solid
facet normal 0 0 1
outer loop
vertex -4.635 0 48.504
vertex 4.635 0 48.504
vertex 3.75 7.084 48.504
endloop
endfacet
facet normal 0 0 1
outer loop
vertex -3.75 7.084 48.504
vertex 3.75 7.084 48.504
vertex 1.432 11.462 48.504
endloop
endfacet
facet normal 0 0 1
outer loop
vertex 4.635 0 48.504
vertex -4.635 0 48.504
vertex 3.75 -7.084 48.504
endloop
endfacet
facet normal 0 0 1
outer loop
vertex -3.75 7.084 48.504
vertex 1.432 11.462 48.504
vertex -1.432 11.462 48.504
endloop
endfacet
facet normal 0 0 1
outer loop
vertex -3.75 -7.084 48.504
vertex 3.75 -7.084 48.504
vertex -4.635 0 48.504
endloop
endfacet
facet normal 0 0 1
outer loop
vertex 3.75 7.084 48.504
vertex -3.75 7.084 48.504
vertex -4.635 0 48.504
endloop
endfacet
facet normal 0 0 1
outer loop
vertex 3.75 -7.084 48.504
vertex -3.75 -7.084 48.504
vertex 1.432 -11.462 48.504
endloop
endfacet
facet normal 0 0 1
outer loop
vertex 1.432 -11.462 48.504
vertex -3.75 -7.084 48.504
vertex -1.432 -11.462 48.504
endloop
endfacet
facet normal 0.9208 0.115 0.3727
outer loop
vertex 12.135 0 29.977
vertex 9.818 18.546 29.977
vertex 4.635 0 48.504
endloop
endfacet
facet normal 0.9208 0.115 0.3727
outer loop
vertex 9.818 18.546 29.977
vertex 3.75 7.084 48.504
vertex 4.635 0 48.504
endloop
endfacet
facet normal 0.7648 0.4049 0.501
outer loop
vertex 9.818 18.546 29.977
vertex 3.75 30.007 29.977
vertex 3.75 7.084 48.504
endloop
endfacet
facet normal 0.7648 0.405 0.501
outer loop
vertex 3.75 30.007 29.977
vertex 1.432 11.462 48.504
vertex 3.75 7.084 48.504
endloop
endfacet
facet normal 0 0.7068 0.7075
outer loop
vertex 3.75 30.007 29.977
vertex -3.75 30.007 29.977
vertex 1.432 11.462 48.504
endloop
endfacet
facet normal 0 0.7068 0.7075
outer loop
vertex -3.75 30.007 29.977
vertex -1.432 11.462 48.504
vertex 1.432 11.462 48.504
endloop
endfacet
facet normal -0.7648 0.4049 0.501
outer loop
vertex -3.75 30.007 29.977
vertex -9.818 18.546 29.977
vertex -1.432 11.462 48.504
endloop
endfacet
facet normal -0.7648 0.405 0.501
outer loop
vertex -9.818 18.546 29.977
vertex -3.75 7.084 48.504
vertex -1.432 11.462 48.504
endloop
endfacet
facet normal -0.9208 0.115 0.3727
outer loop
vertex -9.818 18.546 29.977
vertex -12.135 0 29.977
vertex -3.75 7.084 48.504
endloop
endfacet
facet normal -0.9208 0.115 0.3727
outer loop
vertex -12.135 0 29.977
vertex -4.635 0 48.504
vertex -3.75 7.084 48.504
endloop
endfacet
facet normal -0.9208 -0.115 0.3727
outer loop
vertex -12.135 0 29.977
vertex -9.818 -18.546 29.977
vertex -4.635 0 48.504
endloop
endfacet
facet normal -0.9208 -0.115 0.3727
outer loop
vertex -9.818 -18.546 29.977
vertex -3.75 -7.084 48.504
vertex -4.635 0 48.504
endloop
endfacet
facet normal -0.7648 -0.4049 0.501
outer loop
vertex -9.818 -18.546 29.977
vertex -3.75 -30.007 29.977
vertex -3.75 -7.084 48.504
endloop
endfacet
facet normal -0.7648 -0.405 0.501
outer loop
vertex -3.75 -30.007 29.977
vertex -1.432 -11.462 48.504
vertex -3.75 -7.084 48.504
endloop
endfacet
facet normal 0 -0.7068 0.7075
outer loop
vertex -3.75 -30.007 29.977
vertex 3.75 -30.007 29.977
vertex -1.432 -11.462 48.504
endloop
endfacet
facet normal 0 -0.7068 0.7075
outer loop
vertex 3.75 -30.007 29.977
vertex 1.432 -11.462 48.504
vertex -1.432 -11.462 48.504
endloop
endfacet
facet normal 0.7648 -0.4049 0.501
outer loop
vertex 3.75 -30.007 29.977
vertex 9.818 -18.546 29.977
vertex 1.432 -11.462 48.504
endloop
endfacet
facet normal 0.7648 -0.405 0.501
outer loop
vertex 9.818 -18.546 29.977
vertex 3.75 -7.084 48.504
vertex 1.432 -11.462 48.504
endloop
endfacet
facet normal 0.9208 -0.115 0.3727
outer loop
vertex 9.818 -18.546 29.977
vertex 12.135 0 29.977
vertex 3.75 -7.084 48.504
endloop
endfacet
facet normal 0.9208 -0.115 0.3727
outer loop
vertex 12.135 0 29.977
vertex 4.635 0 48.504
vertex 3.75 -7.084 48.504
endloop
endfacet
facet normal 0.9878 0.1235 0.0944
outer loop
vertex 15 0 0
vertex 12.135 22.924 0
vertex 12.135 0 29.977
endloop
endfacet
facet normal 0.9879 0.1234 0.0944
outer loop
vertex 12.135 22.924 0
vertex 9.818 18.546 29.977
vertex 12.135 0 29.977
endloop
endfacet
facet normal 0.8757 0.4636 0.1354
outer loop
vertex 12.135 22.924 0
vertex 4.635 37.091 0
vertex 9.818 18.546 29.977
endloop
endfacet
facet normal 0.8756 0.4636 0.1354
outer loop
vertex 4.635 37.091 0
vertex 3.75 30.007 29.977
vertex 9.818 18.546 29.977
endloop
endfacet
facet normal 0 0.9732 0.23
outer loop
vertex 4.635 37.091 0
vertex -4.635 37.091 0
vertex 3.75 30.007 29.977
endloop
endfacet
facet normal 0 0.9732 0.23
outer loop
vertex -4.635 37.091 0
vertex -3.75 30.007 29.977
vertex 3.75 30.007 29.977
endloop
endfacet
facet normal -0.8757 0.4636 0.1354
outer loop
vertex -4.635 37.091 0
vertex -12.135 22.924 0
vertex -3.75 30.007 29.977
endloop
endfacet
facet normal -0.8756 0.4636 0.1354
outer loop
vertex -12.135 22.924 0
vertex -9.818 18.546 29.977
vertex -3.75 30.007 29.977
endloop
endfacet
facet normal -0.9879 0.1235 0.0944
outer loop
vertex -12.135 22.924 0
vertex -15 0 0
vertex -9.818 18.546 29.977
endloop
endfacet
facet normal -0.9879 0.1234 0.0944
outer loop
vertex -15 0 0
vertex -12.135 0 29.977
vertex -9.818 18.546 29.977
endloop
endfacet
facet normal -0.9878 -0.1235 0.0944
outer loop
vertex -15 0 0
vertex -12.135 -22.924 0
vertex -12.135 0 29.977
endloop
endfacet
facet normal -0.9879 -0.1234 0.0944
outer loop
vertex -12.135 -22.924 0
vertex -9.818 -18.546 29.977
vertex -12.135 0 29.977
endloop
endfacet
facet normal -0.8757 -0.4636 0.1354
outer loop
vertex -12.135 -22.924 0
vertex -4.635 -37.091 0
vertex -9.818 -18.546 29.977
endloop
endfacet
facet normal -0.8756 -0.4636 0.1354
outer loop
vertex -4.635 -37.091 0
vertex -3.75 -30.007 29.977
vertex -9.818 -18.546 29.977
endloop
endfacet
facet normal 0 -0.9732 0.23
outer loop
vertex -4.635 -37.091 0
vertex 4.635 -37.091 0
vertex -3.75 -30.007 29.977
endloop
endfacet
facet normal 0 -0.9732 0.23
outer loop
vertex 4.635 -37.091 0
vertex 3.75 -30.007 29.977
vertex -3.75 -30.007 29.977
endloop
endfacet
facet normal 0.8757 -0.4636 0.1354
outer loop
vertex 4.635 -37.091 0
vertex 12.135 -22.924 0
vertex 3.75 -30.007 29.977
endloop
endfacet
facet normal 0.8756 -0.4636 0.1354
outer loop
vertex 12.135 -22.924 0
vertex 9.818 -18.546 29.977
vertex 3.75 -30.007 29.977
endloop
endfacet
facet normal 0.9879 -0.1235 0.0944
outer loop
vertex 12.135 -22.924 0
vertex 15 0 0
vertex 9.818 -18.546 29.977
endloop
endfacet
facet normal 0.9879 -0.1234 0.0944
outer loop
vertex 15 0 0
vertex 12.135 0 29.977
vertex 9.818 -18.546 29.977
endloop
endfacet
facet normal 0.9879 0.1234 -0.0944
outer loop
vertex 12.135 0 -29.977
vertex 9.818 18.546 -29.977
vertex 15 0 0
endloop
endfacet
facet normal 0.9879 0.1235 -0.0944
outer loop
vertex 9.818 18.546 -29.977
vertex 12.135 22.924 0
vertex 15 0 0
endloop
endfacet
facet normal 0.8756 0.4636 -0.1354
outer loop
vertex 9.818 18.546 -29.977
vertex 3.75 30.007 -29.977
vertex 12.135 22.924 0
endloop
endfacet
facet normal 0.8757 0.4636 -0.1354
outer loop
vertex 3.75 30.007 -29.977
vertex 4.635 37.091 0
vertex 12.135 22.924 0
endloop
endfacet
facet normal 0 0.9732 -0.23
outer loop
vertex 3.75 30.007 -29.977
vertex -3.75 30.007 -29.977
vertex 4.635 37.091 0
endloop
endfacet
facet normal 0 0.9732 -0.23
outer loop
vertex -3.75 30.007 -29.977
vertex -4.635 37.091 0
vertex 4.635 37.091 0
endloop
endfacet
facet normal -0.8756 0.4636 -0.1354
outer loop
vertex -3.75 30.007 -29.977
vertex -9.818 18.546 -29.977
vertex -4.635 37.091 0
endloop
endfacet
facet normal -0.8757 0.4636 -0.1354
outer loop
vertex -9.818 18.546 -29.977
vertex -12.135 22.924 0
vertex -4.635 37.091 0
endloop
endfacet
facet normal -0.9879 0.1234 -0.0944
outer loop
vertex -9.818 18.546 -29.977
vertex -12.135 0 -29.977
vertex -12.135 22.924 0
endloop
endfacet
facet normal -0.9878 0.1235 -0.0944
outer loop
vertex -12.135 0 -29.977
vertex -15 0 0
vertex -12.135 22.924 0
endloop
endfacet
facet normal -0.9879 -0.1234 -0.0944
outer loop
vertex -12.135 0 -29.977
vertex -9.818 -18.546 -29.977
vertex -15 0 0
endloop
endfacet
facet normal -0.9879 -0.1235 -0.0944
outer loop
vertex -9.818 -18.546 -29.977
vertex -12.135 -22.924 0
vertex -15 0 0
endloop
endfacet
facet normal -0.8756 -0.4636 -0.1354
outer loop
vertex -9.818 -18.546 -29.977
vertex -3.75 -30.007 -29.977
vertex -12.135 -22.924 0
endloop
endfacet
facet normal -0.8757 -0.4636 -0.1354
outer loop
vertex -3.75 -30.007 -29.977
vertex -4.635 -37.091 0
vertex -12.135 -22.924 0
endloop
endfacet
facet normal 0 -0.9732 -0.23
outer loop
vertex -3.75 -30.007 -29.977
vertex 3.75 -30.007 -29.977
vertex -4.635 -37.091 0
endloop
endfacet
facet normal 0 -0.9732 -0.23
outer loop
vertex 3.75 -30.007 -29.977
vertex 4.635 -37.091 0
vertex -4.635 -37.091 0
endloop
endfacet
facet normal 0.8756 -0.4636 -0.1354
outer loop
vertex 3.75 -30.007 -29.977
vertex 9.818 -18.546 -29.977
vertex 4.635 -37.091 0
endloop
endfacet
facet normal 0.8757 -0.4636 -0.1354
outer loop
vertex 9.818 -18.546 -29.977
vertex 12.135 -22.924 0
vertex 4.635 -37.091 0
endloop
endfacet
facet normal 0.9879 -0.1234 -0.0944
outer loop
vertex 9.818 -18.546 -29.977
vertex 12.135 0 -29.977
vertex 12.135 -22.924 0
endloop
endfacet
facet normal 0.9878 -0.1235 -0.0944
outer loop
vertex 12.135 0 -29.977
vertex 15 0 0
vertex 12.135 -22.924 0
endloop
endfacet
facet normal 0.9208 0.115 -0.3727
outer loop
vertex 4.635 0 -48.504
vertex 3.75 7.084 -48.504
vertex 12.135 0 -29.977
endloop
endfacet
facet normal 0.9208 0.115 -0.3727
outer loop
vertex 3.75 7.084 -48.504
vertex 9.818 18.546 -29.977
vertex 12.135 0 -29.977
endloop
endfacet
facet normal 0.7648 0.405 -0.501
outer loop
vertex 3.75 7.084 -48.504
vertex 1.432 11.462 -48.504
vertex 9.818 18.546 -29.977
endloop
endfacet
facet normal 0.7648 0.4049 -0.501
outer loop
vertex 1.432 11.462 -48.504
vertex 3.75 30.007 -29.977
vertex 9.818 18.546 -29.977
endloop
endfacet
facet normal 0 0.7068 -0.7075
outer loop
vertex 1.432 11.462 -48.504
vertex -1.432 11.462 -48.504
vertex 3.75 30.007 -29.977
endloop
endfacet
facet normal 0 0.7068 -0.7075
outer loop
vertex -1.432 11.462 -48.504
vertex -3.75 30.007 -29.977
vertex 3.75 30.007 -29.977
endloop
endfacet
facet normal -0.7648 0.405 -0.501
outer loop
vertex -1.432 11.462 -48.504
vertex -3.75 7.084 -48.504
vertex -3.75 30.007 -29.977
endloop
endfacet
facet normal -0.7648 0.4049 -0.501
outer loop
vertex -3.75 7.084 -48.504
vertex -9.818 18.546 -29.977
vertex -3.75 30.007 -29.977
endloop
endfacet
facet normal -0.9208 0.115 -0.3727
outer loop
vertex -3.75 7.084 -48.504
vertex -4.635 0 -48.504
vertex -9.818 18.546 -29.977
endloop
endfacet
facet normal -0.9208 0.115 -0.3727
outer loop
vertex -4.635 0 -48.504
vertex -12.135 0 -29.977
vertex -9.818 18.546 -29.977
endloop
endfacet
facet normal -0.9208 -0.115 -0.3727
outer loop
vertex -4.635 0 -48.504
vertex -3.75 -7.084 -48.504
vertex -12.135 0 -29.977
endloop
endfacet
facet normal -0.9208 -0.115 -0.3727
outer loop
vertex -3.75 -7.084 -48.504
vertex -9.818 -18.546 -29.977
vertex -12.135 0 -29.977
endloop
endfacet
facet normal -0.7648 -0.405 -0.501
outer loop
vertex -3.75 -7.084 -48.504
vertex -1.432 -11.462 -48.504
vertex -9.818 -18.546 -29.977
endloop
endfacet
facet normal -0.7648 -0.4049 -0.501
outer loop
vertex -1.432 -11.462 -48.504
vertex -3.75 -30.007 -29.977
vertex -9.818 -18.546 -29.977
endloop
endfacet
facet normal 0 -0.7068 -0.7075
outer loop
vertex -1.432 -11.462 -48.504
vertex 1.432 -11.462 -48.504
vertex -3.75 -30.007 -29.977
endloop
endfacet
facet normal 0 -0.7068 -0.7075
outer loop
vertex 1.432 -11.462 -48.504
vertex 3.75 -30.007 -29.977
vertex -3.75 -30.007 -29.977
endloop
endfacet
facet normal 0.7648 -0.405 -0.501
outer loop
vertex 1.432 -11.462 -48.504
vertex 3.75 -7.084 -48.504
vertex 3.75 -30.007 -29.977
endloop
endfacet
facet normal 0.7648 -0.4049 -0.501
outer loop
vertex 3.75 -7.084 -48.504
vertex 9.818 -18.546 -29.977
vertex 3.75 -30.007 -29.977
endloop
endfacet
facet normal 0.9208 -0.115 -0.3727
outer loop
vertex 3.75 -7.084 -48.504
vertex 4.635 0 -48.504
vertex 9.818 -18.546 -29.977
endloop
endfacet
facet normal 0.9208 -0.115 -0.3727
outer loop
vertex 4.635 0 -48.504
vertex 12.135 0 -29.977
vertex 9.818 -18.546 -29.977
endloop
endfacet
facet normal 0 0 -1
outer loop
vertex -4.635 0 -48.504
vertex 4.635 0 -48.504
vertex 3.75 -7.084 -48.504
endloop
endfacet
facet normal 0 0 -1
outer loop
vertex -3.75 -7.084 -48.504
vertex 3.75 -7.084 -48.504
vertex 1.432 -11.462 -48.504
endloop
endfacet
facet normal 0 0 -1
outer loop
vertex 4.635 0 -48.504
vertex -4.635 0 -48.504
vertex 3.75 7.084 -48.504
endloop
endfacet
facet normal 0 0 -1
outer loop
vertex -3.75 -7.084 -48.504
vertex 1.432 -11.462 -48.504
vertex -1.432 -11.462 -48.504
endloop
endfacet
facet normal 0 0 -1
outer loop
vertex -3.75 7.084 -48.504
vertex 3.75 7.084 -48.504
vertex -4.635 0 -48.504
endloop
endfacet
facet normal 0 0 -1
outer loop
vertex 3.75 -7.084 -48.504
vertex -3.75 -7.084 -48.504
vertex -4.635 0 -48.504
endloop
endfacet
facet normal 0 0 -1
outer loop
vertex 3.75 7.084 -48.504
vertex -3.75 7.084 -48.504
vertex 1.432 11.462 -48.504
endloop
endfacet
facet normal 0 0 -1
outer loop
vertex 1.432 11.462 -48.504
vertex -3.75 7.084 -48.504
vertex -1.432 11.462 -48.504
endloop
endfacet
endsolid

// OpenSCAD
// Generated by SolidPython 1.0.1 on 2020-07-29 00:46:46


scale(v = [5, 13, 17]) {
	sphere(r = 3);
}
/***********************************************
*********      SolidPython code:      **********
************************************************
 
# import packages: SolidPython
from solid import *
from solid.utils import *
from itertools import chain, combinations, permutations


class Resize:

    def __init__(self, scad_file):
        self.scad_file = scad_file
        #self.scad_file = import_scad(scad_file)
        # cone/cylinder param:
        self.r1 = 0
        self.r2 = 0
        self.h = 0
        # rectangular prism param:
        self.w = 0
        self.l = 0
        # ellipse param:
        self.r = 0

    # import OpenScad code (file name corresponds to shape)


    # classify shape + parameters
    def assign(self, param1, param2, param3):
        if self.scad_file == 'cone.scad':
            self.r1 = param1
            self.r2 = param2
            self.h = param3
        elif self.scad_file == 'cylinder.scad':
            self.r1 = param1
            self.r2 = param2
            self.h = param3
        elif self.scad_file == 'rectangularPrism.scad':
            self.h = param1
            self.l = param2
            self.w = param3
        else:
            self.r = param1
            self.h = param2

    # resize parameters
    def iterate(self):
        x = range(3, 20, 2)
        i = 1
        if self.scad_file == 'cone.scad':
            tempList = list(permutations(x, 2))
            for temp in tempList:
                param1 = temp[0]
                param2 = temp[1]
                filepath = 'produced_scad_files/' + 'cone' + str(param1) + '_' + str(param2) + '_' + '.scad'
                scad_render_to_file(cylinder(h=param1, r1=param2, r2=0), filepath)

        elif self.scad_file == 'cylinder.scad':
            tempList = list(permutations(x, 3))
            for temp in tempList:
                param1 = temp[0]
                param2 = temp[1]
                filepath = 'produced_scad_files/' + 'cylinder' + str(param1) + '_' + str(param2) + '_' + '.scad'
                scad_render_to_file(cylinder(h=param1, r1=param2, r2=param2), filepath)

        elif self.scad_file == 'rectangularPrism.scad':
            tempList = list(permutations(x, 3))
            for temp in tempList:
                param1 = temp[0]
                param2 = temp[1]
                param3 = temp[2]
                filepath = 'produced_scad_files/' + 'rectangularPrism' + str(param1) + '_' + str(param2) + '_' + str(
                    param3) + '.scad'
                scad_render_to_file(cube(size=(param1, param2, param3)), filepath)

        elif self.scad_file == 'ellipse.scad':
            tempList = list(permutations(x, 4))
            for temp in tempList:
                param1 = temp[0]
                param2 = temp[1]
                param3 = temp[2]
                param4 = temp[3]
                filepath = 'produced_scad_files/' + 'ellipse' + str(param1) + '_' + str(param2) + '_' + str(param3) + '_' + str(param4) + '.scad'
                scad_render_to_file(scale([param1, param2, param3])(sphere(r=param4)), filepath)

    def render_to_scadfile(self):
        scad_render_to_file(scad, 'example.scad') 
 
************************************************/
